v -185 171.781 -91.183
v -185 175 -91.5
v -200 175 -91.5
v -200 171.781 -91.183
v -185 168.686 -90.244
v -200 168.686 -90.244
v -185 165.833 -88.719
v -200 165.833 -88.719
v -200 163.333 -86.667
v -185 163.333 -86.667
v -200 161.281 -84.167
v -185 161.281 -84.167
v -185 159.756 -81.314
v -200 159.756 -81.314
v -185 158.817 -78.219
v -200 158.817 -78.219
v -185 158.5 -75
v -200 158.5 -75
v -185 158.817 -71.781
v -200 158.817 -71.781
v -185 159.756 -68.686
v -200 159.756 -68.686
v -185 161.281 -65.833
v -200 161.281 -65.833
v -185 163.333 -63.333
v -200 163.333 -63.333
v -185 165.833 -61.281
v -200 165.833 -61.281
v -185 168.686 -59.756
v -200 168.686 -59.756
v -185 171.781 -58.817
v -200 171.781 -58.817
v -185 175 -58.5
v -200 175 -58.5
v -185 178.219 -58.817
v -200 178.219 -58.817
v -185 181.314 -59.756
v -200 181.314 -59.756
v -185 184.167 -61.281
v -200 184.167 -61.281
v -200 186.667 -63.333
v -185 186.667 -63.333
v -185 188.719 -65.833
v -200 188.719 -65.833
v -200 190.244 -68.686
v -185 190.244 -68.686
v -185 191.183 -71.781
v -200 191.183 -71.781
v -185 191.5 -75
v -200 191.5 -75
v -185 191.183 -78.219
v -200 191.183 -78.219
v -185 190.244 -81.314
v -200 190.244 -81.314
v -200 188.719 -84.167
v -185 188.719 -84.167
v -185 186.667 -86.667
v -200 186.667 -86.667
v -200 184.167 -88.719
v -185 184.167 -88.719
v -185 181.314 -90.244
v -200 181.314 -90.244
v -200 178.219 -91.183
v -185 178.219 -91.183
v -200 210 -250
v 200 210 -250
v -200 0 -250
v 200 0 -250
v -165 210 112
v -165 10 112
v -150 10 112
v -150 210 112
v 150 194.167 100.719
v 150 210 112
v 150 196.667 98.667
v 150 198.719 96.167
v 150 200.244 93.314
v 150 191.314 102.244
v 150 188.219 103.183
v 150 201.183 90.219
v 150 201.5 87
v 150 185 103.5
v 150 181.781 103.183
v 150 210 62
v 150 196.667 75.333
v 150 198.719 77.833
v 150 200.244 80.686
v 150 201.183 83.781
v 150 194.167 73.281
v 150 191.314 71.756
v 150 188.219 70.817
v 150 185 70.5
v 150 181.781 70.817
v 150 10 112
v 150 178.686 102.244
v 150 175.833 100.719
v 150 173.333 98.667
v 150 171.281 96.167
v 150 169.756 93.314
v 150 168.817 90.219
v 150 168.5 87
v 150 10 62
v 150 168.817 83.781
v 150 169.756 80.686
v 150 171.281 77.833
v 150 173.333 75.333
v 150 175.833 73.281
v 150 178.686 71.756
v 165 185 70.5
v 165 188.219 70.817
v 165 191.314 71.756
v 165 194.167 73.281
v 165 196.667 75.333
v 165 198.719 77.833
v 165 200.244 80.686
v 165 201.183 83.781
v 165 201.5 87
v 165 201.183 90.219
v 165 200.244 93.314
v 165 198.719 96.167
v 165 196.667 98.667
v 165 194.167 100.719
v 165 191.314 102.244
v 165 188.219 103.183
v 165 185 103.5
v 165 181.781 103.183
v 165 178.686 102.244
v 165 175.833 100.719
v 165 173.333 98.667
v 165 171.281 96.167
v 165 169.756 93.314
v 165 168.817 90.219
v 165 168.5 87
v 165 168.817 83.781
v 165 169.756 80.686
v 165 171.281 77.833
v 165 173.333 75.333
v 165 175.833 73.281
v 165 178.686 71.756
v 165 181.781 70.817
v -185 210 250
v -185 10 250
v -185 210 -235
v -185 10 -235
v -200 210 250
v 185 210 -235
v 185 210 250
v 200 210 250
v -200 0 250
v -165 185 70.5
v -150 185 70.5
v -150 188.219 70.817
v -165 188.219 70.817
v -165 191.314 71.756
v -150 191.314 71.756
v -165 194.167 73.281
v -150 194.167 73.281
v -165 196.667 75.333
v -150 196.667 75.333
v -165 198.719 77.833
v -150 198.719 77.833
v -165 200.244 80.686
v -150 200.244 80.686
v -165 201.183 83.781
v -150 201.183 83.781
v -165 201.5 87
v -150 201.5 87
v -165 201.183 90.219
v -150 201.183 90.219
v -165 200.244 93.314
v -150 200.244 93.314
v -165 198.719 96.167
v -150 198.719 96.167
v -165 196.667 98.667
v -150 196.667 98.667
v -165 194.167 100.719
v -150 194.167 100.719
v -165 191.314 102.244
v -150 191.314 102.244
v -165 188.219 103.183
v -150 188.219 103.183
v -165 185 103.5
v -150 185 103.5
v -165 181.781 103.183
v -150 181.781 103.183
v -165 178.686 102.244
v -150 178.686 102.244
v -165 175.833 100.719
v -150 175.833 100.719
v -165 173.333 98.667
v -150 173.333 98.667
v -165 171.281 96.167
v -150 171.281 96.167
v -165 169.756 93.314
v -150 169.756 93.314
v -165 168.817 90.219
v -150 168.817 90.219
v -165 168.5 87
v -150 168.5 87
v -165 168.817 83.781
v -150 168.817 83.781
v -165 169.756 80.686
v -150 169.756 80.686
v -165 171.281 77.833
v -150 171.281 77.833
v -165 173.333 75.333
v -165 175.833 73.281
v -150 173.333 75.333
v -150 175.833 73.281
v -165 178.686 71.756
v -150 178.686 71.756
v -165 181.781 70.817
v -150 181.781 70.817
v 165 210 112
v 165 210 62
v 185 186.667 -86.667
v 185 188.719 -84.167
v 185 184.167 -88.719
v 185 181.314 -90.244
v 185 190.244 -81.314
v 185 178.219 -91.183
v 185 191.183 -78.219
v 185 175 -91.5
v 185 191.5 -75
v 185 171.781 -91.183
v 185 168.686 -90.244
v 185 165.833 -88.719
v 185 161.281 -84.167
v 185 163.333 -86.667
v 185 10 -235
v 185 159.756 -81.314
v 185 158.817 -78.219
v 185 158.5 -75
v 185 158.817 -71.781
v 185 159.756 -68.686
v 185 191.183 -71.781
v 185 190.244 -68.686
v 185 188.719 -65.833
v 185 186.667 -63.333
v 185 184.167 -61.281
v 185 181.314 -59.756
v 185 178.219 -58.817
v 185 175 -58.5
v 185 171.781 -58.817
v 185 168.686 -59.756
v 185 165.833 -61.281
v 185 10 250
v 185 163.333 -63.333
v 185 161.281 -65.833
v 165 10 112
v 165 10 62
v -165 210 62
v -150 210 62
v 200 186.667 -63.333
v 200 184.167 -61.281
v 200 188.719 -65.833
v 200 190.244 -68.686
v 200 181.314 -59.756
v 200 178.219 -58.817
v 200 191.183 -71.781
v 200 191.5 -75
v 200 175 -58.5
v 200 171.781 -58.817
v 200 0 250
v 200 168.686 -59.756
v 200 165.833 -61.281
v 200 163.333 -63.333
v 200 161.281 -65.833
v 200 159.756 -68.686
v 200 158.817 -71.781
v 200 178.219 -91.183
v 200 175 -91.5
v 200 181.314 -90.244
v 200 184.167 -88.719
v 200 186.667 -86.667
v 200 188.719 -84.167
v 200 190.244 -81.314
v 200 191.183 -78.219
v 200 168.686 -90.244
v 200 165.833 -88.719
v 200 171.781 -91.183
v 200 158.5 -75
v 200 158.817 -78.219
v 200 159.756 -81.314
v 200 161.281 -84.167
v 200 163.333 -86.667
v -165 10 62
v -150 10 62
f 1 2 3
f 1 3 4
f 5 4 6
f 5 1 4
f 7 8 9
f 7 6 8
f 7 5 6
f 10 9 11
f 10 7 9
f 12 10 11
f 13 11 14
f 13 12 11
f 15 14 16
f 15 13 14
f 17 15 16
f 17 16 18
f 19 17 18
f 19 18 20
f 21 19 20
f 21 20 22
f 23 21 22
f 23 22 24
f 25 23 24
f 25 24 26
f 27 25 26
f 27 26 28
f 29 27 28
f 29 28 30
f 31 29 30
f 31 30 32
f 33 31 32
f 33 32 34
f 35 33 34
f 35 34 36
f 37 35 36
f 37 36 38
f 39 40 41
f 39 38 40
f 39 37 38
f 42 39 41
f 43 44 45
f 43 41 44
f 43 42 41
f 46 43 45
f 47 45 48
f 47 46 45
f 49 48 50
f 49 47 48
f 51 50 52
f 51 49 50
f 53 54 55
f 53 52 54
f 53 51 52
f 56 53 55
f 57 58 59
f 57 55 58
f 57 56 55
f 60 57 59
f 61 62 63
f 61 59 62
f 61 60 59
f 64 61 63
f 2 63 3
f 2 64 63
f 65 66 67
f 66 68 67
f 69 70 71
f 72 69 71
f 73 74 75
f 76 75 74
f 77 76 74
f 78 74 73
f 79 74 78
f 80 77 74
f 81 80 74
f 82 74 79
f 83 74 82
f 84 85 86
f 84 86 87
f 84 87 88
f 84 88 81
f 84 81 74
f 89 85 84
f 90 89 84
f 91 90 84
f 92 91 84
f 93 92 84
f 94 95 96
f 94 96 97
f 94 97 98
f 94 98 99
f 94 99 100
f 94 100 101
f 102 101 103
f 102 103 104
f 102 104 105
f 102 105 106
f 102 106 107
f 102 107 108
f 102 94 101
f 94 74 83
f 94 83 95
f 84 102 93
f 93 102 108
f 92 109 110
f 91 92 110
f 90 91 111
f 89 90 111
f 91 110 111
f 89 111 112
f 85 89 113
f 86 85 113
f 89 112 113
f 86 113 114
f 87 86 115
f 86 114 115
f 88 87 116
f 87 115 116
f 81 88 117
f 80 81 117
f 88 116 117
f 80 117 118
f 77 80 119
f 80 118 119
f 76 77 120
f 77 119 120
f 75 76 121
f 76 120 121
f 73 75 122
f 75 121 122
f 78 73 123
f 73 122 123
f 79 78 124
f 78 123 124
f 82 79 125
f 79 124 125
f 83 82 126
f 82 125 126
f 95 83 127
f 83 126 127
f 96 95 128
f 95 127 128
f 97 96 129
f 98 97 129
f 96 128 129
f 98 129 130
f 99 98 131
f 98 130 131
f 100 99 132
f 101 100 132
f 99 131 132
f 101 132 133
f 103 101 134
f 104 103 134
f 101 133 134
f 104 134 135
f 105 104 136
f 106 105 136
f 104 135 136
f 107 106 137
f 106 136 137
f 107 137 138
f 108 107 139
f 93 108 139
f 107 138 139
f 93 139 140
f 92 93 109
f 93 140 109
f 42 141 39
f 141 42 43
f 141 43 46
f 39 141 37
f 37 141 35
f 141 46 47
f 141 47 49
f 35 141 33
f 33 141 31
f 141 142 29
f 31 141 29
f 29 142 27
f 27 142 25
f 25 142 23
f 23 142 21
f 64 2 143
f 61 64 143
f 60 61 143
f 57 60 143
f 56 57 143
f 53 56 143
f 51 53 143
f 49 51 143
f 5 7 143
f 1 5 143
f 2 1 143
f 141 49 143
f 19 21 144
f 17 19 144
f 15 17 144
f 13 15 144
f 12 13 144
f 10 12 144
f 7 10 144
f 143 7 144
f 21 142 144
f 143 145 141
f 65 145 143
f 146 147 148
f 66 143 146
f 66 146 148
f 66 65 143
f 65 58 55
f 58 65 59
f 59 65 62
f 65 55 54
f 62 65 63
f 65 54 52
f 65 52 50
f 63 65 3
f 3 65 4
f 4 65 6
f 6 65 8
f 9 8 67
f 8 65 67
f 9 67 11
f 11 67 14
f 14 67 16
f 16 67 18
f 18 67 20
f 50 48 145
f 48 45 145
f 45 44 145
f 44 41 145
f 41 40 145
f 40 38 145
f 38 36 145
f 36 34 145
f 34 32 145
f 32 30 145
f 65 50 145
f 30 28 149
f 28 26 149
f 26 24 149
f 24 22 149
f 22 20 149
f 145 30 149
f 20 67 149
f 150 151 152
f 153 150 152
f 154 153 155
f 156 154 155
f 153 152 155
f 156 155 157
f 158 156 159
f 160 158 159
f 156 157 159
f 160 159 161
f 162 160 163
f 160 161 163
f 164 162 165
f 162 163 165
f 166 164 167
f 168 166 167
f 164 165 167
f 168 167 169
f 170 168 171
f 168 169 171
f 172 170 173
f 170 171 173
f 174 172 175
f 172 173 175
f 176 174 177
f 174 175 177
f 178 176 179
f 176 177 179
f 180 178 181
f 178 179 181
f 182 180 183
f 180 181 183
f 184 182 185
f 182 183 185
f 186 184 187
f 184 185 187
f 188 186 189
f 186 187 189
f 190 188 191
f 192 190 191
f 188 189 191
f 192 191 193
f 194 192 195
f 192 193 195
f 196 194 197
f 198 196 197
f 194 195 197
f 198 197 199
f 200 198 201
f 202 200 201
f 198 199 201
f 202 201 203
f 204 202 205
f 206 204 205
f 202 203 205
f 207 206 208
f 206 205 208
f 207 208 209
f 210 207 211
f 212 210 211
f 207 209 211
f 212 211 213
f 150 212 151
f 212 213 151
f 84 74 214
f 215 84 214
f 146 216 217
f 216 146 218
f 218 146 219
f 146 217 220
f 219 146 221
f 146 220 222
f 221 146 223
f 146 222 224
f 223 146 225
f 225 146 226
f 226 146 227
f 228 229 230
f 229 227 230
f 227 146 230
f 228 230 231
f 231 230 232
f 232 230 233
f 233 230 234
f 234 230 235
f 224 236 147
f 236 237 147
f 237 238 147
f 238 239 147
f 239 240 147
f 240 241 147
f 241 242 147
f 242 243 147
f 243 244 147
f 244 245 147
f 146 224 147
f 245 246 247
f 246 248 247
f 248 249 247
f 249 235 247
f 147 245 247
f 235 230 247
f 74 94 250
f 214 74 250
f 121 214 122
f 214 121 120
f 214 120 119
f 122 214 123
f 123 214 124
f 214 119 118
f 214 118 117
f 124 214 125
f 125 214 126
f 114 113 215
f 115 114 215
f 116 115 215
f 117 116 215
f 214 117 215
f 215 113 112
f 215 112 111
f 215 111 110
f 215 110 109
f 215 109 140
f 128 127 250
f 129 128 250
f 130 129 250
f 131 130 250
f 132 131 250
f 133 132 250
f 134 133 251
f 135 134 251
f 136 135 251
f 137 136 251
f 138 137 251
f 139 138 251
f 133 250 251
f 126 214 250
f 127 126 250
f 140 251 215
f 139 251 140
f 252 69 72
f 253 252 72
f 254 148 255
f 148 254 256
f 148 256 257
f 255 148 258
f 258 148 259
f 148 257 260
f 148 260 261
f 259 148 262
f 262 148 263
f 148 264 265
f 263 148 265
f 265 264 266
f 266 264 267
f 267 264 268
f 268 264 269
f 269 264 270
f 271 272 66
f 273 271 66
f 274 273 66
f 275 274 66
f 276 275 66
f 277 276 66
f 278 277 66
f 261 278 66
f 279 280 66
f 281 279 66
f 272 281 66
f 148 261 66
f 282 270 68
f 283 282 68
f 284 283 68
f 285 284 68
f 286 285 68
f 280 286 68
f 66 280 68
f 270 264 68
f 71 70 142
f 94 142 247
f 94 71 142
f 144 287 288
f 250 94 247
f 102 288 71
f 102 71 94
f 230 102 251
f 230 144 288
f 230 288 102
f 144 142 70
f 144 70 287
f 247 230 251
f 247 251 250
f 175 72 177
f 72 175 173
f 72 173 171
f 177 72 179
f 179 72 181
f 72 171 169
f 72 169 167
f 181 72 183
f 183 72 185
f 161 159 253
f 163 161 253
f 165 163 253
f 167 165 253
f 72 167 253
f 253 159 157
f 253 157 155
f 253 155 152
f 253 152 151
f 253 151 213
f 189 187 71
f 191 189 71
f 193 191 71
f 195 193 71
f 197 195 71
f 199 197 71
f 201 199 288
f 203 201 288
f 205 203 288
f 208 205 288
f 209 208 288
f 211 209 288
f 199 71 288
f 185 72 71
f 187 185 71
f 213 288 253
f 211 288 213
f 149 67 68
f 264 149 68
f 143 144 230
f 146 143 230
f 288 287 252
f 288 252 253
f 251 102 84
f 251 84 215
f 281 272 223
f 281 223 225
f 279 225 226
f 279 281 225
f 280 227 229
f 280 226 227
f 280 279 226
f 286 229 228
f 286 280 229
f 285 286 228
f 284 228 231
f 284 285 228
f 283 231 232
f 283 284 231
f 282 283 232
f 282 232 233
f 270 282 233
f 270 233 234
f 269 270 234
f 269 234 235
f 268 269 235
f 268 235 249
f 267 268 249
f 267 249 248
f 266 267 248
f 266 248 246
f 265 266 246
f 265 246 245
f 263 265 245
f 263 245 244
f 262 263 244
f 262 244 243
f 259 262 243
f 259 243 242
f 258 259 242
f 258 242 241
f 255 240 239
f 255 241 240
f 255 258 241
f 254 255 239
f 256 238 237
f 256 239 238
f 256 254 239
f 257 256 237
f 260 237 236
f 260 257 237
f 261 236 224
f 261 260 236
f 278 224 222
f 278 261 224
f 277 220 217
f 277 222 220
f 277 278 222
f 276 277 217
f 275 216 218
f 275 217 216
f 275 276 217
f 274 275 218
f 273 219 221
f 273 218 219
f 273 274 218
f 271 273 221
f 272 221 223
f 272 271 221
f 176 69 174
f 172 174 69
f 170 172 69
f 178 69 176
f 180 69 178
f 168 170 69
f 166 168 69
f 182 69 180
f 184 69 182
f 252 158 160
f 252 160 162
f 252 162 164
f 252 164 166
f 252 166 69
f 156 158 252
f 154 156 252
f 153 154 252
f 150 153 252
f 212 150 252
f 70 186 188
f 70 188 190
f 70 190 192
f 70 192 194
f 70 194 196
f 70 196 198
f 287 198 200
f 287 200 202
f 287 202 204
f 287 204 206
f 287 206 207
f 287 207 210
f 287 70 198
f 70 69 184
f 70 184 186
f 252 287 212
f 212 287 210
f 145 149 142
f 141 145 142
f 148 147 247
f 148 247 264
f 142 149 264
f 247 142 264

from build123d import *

# Parameters (mm, degrees)
SKETCH3_W               = 400
SKETCH3_H               = 500
BOSS_EXTRUDE1_DEPTH     = 10
BOSS_EXTRUDE3_DEPTH     = 200
CUT_EXTRUDE1_DEPTH      = 517.333225737
CUT_EXTRUDE1_DEPTH_BACK = 517.333225737
SKETCH5_R               = 16.5
SKETCH6_W               = 15
SKETCH6_H               = 50
BOSS_EXTRUDE4_DEPTH     = 200
SKETCH9_R               = 16.5
CUT_EXTRUDE3_DEPTH      = 15
SKETCH10_R              = 16.5
CUT_EXTRUDE4_DEPTH      = 15


with BuildPart() as part:
    # Sketch3 → Boss-Extrude1 (new body)
    with BuildSketch(Plane(origin=(0, 0, 0), x_dir=(1, 0, 0), z_dir=(0, 1, 0))):
        Rectangle(SKETCH3_W, SKETCH3_H)
    extrude(amount=BOSS_EXTRUDE1_DEPTH)

    # Sketch4 → Boss-Extrude3 (add)
    with BuildSketch(Plane(origin=(0, 10, 0), x_dir=(1, 0, 0), z_dir=(0, 1, 0))):
        Polygon((-185, -250), (-185, -235), (-185, 235), (185, 235), (185, -235), (185, -250), (200, -250), (200, 250), (-200, 250), (-200, -250), align=None)
    extrude(amount=BOSS_EXTRUDE3_DEPTH)

    # Sketch5 → Cut-Extrude1 (cut, two sides: drawn at the far end of the back side and taken through both)
    with BuildSketch(Plane.ZY.offset(200).offset(-CUT_EXTRUDE1_DEPTH_BACK)):
        with Locations(Location((-75, 175, 0), (0, 0, 180))):
            Circle(SKETCH5_R)
    extrude(amount=CUT_EXTRUDE1_DEPTH + CUT_EXTRUDE1_DEPTH_BACK, mode=Mode.SUBTRACT)

    # Sketch6 → Boss-Extrude4 (add)
    with BuildSketch(Plane(origin=(0, 10, 0), x_dir=(1, 0, 0), z_dir=(0, 1, 0))):
        with Locations((-157.5, -87)):
            Rectangle(SKETCH6_W, SKETCH6_H)
        with Locations((157.5, -87)):
            Rectangle(SKETCH6_W, SKETCH6_H)
    extrude(amount=BOSS_EXTRUDE4_DEPTH)

    # Sketch9 → Cut-Extrude3 (cut)
    with BuildSketch(Plane(origin=(-150, 0, 0), x_dir=(0, 0, -1), z_dir=(1, 0, 0))):
        with Locations((-87, 185)):
            Circle(SKETCH9_R)
    extrude(amount=-CUT_EXTRUDE3_DEPTH, mode=Mode.SUBTRACT)

    # Sketch10 → Cut-Extrude4 (cut)
    with BuildSketch(Plane(origin=(165, 0, 0), x_dir=(0, 0, -1), z_dir=(1, 0, 0))):
        with Locations((-87, 185)):
            Circle(SKETCH10_R)
    extrude(amount=-CUT_EXTRUDE4_DEPTH, mode=Mode.SUBTRACT)


solid = part.part
